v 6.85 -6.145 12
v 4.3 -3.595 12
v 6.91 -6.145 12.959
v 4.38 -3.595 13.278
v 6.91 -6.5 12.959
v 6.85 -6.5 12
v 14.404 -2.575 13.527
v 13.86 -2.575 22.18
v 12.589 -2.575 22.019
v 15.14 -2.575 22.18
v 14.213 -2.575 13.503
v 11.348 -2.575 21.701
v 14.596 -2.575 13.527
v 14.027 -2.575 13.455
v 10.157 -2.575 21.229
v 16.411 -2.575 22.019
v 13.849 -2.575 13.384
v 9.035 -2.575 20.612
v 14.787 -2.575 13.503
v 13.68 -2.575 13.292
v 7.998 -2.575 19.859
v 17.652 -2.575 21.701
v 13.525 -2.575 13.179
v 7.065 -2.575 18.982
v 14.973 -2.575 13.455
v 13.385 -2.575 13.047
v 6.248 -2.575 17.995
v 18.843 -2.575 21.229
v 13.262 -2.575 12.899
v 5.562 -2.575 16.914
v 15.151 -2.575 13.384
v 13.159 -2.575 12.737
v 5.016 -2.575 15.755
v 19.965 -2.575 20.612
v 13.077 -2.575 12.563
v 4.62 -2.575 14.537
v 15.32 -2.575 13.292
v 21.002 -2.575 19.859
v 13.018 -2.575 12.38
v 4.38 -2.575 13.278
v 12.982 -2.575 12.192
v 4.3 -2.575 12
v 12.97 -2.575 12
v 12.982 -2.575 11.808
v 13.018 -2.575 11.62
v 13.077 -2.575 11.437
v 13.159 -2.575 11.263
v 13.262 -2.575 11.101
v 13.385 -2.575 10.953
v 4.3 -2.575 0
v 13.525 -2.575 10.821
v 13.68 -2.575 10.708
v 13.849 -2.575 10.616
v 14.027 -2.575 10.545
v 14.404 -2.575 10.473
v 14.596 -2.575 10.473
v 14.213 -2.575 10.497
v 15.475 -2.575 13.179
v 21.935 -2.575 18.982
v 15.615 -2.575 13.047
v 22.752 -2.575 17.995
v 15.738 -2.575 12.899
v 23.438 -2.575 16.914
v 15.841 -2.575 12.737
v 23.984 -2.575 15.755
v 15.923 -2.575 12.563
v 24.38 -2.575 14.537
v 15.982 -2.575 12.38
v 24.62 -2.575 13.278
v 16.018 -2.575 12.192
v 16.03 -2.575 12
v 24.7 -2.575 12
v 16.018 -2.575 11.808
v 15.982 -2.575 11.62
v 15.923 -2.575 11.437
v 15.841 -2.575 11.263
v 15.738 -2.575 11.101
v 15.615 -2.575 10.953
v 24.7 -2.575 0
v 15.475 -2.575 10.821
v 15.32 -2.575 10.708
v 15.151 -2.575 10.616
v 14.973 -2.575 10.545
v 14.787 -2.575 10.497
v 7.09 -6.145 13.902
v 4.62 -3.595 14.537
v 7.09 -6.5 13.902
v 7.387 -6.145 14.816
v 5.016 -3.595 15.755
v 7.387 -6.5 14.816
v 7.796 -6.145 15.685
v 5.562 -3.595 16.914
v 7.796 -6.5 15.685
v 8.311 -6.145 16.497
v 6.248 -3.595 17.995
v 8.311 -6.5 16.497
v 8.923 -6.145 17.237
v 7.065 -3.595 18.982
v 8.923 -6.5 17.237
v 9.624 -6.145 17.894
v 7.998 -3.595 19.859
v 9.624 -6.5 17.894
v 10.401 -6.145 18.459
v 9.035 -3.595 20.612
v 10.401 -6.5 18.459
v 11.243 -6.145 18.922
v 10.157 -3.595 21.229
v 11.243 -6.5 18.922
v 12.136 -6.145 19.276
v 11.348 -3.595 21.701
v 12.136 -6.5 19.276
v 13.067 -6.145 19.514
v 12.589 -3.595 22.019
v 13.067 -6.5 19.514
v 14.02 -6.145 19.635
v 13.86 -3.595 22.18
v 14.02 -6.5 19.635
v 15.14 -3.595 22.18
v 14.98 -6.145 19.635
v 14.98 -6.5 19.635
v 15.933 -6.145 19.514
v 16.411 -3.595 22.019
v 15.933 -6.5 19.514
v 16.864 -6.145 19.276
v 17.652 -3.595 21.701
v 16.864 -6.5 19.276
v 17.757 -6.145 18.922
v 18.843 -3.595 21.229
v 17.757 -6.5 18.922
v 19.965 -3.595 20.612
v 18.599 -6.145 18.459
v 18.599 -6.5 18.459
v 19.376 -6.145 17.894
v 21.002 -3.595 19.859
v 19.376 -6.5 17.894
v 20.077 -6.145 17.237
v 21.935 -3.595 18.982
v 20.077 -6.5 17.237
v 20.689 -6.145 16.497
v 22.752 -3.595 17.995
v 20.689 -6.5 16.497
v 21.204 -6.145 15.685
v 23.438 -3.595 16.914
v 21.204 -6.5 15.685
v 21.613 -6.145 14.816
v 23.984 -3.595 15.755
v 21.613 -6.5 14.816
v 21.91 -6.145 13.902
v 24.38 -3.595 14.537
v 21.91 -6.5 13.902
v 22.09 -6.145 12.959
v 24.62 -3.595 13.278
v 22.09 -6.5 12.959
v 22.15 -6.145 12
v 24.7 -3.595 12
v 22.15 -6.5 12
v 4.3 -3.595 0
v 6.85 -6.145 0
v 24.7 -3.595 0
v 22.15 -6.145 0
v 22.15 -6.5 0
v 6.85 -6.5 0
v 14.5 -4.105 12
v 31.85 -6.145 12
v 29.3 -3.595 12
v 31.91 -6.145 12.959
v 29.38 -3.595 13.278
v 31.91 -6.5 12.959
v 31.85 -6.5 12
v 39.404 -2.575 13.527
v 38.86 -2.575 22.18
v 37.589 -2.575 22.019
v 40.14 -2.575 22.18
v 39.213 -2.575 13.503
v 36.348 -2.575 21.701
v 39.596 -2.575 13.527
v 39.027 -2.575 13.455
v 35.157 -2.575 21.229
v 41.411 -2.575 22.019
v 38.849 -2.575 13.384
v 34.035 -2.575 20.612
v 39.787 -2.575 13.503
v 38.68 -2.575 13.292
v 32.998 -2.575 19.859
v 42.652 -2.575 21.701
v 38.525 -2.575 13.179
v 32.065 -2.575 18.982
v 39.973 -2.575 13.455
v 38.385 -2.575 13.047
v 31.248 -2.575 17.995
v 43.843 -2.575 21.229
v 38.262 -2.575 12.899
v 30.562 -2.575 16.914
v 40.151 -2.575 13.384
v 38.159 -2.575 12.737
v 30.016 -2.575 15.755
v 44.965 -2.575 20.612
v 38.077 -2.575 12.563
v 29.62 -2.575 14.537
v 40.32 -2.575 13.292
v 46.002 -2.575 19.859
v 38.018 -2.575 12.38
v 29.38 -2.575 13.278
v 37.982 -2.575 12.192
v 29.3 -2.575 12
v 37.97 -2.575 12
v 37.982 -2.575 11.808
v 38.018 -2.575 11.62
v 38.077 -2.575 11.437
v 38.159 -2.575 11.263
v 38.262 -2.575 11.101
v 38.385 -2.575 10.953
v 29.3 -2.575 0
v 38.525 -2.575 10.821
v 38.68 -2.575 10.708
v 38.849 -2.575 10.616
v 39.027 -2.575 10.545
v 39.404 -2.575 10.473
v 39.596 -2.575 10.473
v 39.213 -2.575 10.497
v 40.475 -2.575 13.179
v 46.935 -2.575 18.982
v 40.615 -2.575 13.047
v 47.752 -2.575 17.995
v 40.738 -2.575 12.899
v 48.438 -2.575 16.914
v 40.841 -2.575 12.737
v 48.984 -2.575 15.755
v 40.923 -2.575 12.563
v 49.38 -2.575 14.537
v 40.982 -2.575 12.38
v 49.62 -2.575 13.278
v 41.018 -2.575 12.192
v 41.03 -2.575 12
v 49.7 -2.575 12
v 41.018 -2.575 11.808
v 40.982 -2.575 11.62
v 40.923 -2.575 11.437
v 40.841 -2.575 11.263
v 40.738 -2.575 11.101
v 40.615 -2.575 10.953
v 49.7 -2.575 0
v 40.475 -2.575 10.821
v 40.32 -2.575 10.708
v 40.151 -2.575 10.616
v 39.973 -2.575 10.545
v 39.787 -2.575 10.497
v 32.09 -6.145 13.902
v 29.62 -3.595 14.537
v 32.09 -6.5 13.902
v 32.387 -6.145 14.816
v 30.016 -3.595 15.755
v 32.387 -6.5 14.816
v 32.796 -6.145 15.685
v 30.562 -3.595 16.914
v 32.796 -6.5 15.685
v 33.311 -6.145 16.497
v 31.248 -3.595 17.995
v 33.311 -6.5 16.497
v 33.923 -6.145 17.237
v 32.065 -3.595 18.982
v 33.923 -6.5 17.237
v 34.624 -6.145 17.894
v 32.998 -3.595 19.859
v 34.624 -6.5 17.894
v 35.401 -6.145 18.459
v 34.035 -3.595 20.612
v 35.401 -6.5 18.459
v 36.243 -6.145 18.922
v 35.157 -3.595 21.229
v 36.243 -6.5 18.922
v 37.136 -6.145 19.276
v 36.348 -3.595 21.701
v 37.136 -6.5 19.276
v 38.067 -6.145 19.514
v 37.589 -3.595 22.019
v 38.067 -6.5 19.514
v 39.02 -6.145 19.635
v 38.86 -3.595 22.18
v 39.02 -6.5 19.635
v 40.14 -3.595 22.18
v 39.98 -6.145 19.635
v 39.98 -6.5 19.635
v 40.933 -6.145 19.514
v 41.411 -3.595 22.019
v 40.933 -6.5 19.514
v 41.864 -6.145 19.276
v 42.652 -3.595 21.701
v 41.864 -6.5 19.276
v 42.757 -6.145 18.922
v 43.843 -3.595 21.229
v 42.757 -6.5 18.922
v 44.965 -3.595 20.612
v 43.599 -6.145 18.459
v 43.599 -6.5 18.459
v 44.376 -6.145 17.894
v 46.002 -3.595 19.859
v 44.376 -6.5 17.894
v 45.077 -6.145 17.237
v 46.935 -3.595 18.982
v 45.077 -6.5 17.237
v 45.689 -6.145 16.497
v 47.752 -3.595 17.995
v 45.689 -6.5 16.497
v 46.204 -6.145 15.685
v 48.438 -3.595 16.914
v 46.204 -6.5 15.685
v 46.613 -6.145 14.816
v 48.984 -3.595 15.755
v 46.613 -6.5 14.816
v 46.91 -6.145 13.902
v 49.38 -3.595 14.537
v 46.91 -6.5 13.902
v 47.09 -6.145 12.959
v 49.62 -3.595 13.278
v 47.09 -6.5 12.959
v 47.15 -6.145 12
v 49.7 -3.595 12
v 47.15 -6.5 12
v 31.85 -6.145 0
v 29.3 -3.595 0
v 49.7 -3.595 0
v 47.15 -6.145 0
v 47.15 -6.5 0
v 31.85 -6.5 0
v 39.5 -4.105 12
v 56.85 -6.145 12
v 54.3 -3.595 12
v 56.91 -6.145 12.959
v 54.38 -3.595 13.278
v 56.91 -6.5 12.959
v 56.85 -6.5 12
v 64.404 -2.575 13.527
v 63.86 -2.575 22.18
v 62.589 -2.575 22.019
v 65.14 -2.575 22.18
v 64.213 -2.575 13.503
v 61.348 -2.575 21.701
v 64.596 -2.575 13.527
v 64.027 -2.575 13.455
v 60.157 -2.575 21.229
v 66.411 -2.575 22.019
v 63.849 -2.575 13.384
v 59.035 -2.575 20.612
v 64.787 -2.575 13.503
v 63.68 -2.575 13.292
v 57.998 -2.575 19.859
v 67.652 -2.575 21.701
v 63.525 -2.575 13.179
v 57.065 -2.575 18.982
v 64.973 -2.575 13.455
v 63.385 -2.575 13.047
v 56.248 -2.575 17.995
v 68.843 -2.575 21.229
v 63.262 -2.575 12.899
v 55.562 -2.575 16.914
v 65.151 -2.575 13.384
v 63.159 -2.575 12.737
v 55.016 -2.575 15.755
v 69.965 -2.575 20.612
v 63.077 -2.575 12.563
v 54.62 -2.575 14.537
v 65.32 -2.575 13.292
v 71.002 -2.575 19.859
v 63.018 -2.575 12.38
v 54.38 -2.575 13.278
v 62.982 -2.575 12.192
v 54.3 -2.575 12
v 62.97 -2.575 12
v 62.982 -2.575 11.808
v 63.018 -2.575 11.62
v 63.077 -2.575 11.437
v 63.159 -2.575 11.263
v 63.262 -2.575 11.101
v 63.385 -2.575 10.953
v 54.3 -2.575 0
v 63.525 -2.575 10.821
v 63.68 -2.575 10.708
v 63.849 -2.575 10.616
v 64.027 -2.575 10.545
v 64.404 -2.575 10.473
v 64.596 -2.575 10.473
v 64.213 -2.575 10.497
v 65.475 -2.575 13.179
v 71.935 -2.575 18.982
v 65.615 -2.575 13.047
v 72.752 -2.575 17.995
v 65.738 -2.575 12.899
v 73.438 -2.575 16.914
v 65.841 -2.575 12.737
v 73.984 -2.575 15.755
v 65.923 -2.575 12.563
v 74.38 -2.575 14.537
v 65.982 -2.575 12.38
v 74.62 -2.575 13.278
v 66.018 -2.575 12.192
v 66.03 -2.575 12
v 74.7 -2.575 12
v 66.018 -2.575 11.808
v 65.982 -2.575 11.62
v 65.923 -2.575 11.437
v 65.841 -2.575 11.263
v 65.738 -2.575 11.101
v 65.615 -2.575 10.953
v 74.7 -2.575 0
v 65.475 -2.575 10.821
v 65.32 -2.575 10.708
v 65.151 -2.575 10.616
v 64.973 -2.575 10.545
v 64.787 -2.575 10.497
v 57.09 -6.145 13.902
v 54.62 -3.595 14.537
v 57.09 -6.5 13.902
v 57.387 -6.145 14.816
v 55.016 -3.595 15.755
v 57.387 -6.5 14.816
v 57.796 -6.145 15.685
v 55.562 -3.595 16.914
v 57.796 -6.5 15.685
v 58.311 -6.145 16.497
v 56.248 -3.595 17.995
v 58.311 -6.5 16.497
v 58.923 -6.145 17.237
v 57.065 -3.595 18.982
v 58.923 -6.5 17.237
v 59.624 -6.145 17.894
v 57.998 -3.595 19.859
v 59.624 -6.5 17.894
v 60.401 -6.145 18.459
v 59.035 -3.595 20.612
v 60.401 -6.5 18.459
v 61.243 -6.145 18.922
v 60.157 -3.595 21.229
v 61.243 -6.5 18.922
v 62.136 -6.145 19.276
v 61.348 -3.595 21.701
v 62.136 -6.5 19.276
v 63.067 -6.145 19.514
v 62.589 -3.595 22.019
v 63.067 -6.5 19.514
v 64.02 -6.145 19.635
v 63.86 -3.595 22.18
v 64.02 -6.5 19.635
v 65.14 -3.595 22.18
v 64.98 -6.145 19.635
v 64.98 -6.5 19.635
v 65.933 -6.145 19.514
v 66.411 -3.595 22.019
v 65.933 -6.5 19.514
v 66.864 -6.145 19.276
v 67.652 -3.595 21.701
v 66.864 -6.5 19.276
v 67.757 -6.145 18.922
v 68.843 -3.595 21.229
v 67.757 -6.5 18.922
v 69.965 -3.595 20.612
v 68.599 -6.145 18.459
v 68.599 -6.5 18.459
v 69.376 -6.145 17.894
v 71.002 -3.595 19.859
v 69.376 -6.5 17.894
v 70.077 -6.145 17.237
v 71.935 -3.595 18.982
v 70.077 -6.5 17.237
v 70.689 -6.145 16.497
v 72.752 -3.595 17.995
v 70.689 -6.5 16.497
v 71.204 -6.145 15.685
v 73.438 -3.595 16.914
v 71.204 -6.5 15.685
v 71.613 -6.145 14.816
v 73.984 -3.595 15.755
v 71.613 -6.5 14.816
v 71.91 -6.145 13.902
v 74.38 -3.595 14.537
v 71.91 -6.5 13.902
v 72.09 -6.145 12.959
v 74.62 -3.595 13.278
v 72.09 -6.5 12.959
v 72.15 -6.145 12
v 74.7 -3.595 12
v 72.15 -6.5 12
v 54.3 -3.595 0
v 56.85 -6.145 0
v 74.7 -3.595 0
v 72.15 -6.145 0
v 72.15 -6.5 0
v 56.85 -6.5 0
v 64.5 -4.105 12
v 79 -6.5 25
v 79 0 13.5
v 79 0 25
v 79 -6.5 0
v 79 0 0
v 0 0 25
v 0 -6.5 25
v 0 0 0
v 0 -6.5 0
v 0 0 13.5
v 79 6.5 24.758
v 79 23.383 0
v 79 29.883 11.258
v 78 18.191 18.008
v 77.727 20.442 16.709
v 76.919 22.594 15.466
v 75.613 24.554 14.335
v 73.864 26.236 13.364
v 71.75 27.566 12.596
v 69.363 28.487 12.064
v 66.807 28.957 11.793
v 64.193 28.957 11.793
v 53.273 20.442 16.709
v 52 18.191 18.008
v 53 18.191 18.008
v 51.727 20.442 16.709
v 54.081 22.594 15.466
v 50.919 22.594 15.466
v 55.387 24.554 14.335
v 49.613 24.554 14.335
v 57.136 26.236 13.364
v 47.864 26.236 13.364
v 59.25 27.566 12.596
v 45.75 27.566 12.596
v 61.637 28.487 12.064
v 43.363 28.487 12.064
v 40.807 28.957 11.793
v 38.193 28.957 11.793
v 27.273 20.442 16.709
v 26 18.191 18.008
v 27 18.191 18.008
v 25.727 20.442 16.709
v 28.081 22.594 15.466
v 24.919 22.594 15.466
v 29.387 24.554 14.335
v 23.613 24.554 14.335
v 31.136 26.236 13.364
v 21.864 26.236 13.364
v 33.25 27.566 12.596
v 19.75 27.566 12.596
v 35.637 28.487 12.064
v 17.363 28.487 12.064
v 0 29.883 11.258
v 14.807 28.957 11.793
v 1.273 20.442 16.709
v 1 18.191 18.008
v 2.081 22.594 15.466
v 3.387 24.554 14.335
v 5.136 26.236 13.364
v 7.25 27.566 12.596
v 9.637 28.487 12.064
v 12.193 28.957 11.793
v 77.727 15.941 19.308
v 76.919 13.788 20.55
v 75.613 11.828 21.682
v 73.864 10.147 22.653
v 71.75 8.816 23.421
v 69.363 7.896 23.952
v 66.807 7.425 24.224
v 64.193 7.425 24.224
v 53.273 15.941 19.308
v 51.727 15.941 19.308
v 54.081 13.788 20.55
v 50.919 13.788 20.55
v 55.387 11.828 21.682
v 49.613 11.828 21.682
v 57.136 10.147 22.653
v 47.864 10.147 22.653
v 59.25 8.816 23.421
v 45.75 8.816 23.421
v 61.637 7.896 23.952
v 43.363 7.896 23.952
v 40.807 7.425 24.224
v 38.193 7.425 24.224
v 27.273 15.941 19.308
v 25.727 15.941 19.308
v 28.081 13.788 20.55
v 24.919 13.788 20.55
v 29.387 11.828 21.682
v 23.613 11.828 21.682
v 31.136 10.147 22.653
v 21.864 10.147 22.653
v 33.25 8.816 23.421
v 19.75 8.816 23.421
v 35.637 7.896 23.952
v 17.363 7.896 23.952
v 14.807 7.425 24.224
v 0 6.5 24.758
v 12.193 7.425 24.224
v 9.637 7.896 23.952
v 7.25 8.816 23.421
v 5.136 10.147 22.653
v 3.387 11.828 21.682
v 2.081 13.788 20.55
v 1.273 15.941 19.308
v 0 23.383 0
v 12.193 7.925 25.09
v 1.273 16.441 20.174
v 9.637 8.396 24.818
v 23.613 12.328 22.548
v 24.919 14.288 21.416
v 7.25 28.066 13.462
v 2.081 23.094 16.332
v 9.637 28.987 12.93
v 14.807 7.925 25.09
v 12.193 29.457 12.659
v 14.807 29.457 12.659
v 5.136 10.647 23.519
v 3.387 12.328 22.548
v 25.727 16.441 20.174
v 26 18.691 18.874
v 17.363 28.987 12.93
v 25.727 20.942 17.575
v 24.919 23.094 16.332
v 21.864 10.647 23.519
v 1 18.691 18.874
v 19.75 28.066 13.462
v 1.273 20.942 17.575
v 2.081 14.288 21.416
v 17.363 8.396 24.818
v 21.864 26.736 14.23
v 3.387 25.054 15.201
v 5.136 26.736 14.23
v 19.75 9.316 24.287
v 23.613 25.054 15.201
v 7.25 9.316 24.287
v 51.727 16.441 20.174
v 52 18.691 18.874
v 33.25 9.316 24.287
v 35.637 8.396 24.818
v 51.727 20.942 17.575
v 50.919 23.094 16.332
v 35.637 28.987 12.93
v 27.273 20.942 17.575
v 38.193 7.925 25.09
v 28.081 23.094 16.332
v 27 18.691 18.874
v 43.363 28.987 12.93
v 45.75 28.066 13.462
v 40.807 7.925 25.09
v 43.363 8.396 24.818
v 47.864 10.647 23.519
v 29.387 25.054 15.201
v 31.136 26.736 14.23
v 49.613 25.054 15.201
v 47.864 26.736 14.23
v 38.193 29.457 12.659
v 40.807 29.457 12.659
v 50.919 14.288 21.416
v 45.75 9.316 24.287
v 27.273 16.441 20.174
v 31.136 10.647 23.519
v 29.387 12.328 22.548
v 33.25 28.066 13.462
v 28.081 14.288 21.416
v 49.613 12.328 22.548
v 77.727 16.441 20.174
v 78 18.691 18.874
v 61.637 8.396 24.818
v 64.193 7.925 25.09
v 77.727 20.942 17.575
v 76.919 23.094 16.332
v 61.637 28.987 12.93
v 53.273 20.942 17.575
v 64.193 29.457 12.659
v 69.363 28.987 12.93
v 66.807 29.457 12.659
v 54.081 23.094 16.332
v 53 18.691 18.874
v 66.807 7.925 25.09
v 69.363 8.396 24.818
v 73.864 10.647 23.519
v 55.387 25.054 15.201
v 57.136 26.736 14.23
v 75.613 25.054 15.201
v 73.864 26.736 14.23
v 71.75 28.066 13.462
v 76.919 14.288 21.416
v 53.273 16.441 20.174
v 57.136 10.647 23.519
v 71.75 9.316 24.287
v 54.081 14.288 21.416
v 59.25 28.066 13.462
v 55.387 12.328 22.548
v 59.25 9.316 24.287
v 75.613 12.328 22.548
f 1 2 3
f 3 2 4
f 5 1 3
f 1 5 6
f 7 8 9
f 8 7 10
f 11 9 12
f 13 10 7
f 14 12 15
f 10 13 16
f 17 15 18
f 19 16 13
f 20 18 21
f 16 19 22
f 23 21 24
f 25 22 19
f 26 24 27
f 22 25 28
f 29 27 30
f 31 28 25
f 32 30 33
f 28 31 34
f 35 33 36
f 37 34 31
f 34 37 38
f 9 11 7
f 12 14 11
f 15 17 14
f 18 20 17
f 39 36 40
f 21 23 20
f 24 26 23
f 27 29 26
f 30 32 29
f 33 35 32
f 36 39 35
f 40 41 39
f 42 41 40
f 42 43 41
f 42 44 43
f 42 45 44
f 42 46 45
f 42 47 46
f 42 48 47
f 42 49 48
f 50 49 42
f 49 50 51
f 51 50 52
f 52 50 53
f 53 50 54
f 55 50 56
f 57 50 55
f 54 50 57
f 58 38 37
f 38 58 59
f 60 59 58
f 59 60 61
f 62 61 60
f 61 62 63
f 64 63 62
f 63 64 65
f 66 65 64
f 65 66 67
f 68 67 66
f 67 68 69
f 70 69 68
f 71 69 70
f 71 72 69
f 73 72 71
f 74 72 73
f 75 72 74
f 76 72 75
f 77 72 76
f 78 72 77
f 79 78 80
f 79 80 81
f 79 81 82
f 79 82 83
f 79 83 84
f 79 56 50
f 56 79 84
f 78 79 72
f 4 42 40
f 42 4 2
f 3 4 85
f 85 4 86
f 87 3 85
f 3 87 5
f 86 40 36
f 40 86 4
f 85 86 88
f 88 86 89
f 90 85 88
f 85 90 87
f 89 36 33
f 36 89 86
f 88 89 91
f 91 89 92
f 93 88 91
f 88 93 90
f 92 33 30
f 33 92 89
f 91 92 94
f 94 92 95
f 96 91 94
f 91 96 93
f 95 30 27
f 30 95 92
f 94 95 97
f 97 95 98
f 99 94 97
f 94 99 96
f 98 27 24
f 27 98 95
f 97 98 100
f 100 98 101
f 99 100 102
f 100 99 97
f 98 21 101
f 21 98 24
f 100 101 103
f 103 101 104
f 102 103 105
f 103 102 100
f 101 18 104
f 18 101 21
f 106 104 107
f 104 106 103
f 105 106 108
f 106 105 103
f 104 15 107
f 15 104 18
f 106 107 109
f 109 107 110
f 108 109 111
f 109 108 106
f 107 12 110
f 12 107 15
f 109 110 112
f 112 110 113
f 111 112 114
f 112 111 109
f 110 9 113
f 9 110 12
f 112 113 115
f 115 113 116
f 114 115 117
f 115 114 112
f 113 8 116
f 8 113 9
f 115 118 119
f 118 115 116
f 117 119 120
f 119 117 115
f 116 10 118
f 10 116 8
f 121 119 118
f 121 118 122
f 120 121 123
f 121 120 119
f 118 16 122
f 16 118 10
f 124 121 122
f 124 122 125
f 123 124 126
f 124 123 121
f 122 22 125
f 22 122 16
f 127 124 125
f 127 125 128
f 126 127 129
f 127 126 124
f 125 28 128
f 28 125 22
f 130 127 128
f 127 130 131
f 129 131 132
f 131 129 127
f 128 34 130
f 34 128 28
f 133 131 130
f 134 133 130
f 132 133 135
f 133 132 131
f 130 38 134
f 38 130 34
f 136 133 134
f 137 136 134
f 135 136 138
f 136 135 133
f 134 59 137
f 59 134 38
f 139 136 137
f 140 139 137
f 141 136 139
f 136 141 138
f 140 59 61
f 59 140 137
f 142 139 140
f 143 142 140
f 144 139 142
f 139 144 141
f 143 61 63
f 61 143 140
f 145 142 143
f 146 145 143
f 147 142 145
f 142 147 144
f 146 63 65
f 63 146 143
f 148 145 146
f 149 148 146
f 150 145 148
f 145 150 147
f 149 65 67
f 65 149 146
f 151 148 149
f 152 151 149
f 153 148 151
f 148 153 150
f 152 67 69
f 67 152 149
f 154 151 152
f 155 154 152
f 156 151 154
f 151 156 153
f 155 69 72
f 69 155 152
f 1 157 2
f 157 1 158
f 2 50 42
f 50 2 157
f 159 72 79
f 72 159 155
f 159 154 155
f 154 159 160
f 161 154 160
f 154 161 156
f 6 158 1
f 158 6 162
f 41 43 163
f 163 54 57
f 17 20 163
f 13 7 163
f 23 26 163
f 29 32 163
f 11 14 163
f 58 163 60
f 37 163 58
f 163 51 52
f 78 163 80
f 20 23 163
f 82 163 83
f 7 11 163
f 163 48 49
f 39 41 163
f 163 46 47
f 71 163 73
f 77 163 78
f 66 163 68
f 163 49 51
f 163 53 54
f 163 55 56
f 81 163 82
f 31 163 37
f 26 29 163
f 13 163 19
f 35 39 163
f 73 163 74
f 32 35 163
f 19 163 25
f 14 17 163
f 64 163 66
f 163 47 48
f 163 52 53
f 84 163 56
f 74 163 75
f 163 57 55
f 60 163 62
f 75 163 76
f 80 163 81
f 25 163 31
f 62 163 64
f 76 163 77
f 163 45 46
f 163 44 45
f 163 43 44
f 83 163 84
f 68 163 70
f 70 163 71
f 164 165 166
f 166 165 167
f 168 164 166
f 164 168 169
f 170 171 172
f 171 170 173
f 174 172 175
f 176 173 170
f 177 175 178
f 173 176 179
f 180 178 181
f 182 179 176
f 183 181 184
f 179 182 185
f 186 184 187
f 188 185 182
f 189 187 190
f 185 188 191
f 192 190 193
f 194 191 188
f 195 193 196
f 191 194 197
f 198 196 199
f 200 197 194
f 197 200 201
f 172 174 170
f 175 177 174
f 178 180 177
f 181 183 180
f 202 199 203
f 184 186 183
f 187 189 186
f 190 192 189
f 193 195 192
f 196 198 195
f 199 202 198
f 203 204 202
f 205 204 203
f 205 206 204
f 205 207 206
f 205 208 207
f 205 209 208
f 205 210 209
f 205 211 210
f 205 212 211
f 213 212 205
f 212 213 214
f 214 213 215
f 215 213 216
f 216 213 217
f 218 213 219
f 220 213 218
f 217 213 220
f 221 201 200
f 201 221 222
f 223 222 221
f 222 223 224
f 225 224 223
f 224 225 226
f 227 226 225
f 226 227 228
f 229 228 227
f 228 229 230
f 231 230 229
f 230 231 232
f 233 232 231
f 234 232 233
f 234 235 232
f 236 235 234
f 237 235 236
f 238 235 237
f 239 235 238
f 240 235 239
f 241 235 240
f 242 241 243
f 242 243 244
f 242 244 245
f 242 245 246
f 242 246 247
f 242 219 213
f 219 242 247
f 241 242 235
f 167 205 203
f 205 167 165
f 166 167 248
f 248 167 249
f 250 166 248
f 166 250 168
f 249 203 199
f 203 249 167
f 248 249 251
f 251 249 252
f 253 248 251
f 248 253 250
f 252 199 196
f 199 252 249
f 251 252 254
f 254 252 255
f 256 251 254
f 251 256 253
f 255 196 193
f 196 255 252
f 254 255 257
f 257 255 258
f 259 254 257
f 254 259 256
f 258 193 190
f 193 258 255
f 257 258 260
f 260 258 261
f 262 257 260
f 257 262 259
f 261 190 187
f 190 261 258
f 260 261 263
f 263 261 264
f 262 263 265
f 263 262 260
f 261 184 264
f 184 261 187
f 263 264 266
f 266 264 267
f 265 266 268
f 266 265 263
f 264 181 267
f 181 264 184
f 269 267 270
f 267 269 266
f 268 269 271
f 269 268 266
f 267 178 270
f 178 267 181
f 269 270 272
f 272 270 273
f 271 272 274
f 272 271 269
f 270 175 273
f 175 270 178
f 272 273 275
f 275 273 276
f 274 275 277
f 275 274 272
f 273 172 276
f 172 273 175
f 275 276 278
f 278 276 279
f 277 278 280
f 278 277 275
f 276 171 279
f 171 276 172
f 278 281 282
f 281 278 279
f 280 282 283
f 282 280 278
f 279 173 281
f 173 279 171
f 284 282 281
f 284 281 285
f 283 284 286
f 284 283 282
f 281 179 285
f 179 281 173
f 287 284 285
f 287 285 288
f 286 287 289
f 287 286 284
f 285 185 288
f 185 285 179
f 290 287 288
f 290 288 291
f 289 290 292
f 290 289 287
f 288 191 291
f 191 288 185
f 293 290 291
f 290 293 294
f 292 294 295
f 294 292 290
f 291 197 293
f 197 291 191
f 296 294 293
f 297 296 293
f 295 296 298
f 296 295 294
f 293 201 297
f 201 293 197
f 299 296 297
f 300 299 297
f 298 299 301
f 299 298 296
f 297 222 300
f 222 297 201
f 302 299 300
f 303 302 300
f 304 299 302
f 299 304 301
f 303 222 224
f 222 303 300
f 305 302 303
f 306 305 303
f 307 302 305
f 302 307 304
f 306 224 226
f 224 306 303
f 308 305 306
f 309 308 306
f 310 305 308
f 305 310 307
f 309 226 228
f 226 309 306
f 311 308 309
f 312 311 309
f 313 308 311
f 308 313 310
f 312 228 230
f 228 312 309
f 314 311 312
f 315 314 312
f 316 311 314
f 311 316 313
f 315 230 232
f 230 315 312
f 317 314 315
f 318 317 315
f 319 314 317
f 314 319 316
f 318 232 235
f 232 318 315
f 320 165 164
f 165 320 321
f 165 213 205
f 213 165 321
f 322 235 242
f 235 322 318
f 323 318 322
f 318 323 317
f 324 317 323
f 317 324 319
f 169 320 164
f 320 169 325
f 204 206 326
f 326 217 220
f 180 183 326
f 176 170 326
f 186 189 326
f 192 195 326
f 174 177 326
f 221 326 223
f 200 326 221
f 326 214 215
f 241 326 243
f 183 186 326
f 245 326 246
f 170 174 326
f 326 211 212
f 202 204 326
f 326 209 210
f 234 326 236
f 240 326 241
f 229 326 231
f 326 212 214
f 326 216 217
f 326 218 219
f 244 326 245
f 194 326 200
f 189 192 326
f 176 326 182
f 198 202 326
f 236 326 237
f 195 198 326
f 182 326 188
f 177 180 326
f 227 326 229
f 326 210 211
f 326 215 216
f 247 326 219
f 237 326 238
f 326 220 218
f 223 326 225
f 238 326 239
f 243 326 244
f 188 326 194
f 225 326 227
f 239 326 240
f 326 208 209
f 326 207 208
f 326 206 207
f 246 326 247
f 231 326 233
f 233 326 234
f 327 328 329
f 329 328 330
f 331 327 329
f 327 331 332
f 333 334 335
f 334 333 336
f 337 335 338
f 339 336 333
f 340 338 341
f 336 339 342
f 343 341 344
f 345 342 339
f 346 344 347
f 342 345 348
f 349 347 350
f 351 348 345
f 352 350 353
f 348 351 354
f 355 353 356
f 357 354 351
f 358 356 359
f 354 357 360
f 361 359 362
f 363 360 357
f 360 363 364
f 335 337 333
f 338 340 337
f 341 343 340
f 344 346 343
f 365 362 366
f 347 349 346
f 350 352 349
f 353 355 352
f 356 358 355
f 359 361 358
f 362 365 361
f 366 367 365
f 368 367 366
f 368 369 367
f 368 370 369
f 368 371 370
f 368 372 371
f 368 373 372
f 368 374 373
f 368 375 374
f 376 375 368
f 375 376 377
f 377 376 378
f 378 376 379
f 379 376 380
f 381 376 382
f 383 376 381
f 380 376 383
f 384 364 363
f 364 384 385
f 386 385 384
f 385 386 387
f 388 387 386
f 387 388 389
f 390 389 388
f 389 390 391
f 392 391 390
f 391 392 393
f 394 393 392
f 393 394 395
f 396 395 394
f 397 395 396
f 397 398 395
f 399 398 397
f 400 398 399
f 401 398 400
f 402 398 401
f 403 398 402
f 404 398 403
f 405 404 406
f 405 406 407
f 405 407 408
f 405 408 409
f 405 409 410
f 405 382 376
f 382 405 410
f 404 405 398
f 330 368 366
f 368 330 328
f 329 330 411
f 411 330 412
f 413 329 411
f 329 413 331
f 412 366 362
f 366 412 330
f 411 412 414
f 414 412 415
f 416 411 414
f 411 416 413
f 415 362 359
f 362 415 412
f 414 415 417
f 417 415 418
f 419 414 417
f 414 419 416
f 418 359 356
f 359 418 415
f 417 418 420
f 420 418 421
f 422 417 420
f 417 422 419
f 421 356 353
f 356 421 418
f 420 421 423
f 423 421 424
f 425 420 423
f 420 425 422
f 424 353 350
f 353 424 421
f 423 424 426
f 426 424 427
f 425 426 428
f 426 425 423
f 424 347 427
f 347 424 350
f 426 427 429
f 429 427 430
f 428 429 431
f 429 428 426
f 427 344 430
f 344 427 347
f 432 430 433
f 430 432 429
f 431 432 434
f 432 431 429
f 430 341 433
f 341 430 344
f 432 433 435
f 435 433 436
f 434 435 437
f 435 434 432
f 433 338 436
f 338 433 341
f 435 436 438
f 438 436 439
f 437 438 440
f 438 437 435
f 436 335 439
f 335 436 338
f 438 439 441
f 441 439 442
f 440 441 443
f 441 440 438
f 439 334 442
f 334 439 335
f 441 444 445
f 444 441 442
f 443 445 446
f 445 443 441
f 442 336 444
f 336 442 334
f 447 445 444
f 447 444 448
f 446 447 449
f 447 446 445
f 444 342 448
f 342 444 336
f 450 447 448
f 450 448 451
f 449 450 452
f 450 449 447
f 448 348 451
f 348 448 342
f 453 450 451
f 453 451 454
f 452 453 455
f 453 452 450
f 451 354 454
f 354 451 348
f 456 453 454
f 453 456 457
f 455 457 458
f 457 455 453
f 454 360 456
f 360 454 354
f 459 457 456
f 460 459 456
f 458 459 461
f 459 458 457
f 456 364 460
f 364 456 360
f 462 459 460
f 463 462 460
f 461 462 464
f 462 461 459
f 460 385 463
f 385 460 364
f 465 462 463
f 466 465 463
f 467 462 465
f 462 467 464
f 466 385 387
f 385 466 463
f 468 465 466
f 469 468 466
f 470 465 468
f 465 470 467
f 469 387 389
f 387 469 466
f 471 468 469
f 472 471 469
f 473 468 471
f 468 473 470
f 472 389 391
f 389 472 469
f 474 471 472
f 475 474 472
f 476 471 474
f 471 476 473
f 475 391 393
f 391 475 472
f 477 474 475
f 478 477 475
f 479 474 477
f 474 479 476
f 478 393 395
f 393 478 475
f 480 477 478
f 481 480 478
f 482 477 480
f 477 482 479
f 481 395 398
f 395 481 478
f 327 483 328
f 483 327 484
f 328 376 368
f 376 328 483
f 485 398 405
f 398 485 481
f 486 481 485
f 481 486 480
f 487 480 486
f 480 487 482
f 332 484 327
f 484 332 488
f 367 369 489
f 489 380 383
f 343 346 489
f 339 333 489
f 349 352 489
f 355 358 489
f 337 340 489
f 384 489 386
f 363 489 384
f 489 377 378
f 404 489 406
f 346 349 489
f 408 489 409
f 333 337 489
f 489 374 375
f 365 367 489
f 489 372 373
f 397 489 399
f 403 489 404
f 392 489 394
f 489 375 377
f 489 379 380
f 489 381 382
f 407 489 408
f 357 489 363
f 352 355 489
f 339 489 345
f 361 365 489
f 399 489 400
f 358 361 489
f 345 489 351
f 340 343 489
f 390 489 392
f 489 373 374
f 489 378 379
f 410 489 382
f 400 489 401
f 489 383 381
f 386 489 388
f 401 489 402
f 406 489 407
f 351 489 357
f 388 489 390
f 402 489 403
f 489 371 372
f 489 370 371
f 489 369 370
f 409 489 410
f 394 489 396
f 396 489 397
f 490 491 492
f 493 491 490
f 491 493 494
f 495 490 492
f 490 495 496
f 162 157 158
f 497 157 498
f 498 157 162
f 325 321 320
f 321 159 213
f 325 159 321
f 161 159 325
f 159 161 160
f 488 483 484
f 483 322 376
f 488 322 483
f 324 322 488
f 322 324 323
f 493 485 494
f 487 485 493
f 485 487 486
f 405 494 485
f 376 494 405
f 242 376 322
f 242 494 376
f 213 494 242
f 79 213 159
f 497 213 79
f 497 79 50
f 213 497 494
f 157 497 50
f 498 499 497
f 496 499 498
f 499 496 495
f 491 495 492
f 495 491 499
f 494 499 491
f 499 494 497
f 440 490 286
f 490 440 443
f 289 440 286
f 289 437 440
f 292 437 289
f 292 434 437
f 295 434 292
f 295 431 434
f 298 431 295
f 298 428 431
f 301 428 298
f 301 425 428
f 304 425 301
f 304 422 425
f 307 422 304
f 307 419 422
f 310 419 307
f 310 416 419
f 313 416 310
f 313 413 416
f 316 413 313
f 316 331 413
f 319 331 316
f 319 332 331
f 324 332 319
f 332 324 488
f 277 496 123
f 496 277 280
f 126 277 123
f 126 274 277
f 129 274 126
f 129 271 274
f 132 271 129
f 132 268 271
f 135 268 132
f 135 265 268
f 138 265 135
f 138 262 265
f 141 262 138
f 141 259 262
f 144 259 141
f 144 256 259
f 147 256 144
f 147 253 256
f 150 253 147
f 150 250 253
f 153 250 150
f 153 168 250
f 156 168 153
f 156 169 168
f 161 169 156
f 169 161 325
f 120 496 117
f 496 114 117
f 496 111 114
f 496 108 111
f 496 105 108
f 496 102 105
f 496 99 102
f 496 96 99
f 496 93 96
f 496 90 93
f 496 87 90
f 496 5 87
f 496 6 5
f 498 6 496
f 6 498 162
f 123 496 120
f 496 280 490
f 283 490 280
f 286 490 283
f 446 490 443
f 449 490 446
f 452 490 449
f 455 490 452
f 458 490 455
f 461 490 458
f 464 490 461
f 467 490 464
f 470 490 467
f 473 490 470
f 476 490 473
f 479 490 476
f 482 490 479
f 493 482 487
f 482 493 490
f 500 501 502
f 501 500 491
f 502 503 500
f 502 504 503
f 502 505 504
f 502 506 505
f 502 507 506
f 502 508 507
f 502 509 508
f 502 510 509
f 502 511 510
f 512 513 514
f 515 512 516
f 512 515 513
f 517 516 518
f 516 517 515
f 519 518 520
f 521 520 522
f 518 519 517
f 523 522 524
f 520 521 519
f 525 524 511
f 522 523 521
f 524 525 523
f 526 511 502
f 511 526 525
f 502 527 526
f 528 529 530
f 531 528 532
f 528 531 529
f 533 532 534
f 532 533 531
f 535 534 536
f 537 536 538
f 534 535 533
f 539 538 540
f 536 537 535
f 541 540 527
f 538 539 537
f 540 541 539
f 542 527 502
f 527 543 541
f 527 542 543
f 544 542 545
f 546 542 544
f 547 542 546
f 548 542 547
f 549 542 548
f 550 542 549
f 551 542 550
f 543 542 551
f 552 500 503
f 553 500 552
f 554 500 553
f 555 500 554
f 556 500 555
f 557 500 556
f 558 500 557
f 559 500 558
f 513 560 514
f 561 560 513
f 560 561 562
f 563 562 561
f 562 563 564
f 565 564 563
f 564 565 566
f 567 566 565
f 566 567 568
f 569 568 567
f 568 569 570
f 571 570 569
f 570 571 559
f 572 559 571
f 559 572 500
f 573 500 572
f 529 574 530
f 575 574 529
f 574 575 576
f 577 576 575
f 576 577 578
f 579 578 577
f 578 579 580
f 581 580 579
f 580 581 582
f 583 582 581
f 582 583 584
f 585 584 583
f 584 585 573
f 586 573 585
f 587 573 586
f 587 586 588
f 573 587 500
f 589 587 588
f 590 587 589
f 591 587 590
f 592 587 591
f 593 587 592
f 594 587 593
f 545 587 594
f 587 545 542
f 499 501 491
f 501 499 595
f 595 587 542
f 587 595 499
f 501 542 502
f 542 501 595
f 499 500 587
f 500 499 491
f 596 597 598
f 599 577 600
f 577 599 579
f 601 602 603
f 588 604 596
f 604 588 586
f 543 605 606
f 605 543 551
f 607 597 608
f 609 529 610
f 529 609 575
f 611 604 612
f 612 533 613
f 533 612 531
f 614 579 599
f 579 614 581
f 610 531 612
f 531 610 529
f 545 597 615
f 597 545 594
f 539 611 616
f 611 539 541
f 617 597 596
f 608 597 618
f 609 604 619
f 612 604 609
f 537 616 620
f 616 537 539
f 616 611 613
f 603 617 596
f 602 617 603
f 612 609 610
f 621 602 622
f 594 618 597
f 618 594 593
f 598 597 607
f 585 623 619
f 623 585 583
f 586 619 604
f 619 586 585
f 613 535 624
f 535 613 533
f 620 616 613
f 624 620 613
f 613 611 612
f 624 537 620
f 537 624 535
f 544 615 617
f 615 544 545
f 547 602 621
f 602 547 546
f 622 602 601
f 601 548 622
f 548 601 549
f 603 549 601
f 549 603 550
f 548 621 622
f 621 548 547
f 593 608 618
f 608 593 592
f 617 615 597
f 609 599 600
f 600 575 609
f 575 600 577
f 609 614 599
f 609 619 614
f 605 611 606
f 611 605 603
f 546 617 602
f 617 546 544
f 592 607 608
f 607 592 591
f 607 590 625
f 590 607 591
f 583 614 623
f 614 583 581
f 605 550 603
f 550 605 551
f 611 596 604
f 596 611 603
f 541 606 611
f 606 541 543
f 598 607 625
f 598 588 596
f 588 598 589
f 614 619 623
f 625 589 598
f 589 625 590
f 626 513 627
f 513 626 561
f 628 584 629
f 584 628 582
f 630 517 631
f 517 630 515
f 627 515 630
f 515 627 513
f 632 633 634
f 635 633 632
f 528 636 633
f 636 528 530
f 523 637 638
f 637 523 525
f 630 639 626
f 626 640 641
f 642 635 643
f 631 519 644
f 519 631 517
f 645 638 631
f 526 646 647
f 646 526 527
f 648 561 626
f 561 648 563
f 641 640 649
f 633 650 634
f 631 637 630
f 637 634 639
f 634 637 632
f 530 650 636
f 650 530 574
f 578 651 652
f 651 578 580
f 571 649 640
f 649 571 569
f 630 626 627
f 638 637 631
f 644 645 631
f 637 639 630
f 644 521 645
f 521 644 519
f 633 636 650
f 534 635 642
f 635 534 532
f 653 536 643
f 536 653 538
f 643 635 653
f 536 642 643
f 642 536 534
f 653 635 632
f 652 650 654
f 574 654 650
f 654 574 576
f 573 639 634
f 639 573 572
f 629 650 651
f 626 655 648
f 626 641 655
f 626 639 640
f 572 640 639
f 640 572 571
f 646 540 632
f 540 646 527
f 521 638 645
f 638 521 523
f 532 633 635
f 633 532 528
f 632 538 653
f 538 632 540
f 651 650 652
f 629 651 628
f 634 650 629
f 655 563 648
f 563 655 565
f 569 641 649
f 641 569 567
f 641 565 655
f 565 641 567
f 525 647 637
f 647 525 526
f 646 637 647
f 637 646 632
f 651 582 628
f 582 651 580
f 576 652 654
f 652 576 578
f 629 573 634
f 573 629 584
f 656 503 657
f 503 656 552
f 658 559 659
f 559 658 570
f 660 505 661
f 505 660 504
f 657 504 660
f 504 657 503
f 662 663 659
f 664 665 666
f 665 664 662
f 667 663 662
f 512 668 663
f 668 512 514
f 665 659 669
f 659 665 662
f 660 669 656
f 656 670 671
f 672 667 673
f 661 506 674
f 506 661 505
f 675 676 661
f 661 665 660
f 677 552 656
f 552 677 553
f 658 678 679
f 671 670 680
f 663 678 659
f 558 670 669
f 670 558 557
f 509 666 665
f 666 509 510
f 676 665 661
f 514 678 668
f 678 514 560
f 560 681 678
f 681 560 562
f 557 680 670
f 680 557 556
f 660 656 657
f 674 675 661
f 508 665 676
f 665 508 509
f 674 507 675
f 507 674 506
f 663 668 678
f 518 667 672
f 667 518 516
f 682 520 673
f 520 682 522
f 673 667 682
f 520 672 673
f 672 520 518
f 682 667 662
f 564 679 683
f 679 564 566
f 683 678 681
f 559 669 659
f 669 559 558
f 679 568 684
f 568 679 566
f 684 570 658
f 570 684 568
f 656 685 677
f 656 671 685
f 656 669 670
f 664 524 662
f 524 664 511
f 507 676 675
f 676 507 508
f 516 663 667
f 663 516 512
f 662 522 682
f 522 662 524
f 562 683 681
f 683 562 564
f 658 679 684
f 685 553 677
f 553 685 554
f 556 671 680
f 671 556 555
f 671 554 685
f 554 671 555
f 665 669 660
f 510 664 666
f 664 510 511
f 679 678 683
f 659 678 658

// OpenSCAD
/*Created by Andy Levesque
Credit to @David D on Printables and Jonathan at Keep Making for Multiconnect and Multiboard, respectively
Licensed Creative Commons 4.0 Attribution Non-Commercial Sharable with Attribution
*/

/*
TODO: 
    Important: Fix hull issue when angle is less than 20
    - Cap print angle to 45 when item angle exceeds 45
    - Separate distanceBetweenEach and front/back thickness
    - Fix backer height for high diameter items
    - Clean up unused parameters
*/

/*[Parameters]*/
//diameter (in mm) of the item you wish to insert (this becomes the internal diameter)
itemDiameter = 25;
//distance between each item (in mm)
distanceBetweenEach = 1;
//Thickness (in mm) of the base underneath the item you are holding
baseThickness = 3;
//Additional thickness of the area between the item holding and the backer.
shelfSupportHeight = 0;
//Angle for items
itemAngle = 30; //[0:1:60]
//Additional height (in mm) of the rim protruding upward to hold the item
holeDepth = 10;
//Additional Backer Height (in mm) in case you prefer additional support for something heavy
additionalBackerHeight = 0;
//number of items you wish to hold width-wise (along the back)
itemsWide = 3;
//number of items you wish to hold depth-wise (away from back)
itemsDeep = 1;
//item row offset
tierOffestZ = itemDiameter/2;

/* [Slot Customization] */
//Distance between Multiconnect slots on the back (25mm is standard for MultiBoard)
distanceBetweenSlots = 25;
//QuickRelease removes the small indent in the top of the slots that lock the part into place
slotQuickRelease = false;
//Dimple scale tweaks the size of the dimple in the slot for printers that need a larger dimple to print correctly
dimpleScale = 1; //[0.5:.05:1.5]
//Scale of slots in the back (1.015 scale is default per MultiConnect specs)
slotTolerance = 1.02; //[1.0:0.005:1.075]

/*[Hidden]*/
//fit items plus 
totalWidth = itemDiameter*itemsWide + distanceBetweenEach*itemsWide + distanceBetweenEach;

rowDepth = itemDiameter+distanceBetweenEach*2;
//inputs the row depth and desired angle to calculate the height of the back
rowBackHeight = rowDepth * tan(itemAngle);

//Thickness of the back of the item (default in 6.5mm). Changes are untested. 
backThickness = 6.5; //.1
//slot count calculates how many slots can fit on the back. Based on internal width for buffer.
slotCount = floor(max(distanceBetweenSlots,totalWidth)/distanceBetweenSlots);
echo(str("Slot Count: ",slotCount));
backWidth = max(distanceBetweenSlots,totalWidth);

hypotenuse = rowDepth;
smallHypotenuse = holeDepth+baseThickness;
triangleY = min(sin(itemAngle)*hypotenuse,tan(itemAngle)*hypotenuse);
triangleX = min(cos(itemAngle)*hypotenuse,tan(itemAngle)*hypotenuse);
smallTriangleY = min(sin(itemAngle)*smallHypotenuse,tan(itemAngle)*smallHypotenuse);
smallTriangleX = min(cos(itemAngle)*smallHypotenuse,tan(itemAngle)*smallHypotenuse);
inverseSmallTriangleY = min(sin(90-itemAngle)*smallHypotenuse,tan(90-itemAngle)*smallHypotenuse);
inverseSmallTriangleX = min(cos(90-itemAngle)*smallHypotenuse,tan(90-itemAngle)*smallHypotenuse);
totalHeight = max(triangleY+inverseSmallTriangleY,25);

//start build
back(backWidth = backWidth, backHeight = totalHeight+additionalBackerHeight, backThickness = backThickness);
//create shelves
//hull() {
    translate(v = [0,0,0]) rotate(a = [0,-90,0]) 
    polygon(points = [[0,0],[triangleY+inverseSmallTriangleY,0],[triangleY+inverseSmallTriangleY,smallTriangleY]]);
    //cube(size = [backWidth,1,totalHeight]);
    //color(c = "green") rotate(a = [-itemAngle,0,0]) cube(size = [backWidth,1,holeDepth+baseThickness]);
//}
    for(itemY = [0:1:itemsDeep-1]){
        for (itemX = [0:1:itemsWide-1]){
            translate(v = [0,0,triangleY])     
                rotate([-itemAngle,0,0]) {
                    //shelf
                    cube(size = [totalWidth, rowDepth,holeDepth+baseThickness]);
                    //delete tools
                    //translate(v = [itemDiameter/2+distanceBetweenEach + (itemX*itemDiameter+distanceBetweenEach*itemX),itemY*rowDepth+itemDiameter/2+distanceBetweenEach,baseThickness]) 
                    //    color(c = "red") cylinder(h = holeDepth+1, r = itemDiameter/2);
                }
        }
    }


//delete tools
for(itemY = [0:1:itemsDeep-1]){
    for (itemX = [0:1:itemsWide-1]){
        translate(v = [0,0,triangleY])     
            rotate([-itemAngle,0,0]) {
                //shelf
                //cube(size = [totalWidth, rowDepth,holeDepth+baseThickness]);
                //delete tools
                translate(v = [itemDiameter/2+distanceBetweenEach + (itemX*itemDiameter+distanceBetweenEach*itemX),itemY*rowDepth+itemDiameter/2+distanceBetweenEach,baseThickness]) 
                    color(c = "red") cylinder(h = holeDepth+1, r = itemDiameter/2);
            }
    }
}

//BEGIN MODULES
//Slotted back
module back(backWidth, backHeight, backThickness)
{

    difference() {
        translate(v = [0,-backThickness,0]) cube(size = [backWidth,backThickness,backHeight]);
        //Loop through slots and center on the item
        //Note: I kept doing math until it looked right. It's possible this can be simplified.
        for (slotNum = [0:1:slotCount-1]) {
            translate(v = [distanceBetweenSlots/2+(backWidth/distanceBetweenSlots-slotCount)*distanceBetweenSlots/2+slotNum*distanceBetweenSlots,-2.575,backHeight-13]) {
                color(c = "red")  slotTool(backHeight);
            }
        }
    }
}
//Create Slot Tool
module slotTool(productHeight) {
    //translate(v = [0,-0.075,0]) //removed for redundancy
    scale(v = slotTolerance) //scale for 0.15mm tolerance per Multiconnect design specs
    difference() {
        union() {
            //round top
            rotate(a = [90,0,0,]) 
                rotate_extrude($fn=50) 
                    polygon(points = [[0,0],[10,0],[10,1],[7.5,3.5],[7.5,4],[0,4]]);
            //long slot
            translate(v = [0,0,0]) 
                rotate(a = [180,0,0]) 
                linear_extrude(height = productHeight+1) 
                    union(){
                        polygon(points = [[0,0],[10,0],[10,1],[7.5,3.5],[7.5,4],[0,4]]);
                        mirror([1,0,0])
                            polygon(points = [[0,0],[10,0],[10,1],[7.5,3.5],[7.5,4],[0,4]]);
                    }
        }
        //dimple
        if (slotQuickRelease == false)
            scale(v = dimpleScale) 
            rotate(a = [90,0,0,]) 
                rotate_extrude($fn=50) 
                    polygon(points = [[0,0],[0,1.5],[1.5,0]]);
    }
}
